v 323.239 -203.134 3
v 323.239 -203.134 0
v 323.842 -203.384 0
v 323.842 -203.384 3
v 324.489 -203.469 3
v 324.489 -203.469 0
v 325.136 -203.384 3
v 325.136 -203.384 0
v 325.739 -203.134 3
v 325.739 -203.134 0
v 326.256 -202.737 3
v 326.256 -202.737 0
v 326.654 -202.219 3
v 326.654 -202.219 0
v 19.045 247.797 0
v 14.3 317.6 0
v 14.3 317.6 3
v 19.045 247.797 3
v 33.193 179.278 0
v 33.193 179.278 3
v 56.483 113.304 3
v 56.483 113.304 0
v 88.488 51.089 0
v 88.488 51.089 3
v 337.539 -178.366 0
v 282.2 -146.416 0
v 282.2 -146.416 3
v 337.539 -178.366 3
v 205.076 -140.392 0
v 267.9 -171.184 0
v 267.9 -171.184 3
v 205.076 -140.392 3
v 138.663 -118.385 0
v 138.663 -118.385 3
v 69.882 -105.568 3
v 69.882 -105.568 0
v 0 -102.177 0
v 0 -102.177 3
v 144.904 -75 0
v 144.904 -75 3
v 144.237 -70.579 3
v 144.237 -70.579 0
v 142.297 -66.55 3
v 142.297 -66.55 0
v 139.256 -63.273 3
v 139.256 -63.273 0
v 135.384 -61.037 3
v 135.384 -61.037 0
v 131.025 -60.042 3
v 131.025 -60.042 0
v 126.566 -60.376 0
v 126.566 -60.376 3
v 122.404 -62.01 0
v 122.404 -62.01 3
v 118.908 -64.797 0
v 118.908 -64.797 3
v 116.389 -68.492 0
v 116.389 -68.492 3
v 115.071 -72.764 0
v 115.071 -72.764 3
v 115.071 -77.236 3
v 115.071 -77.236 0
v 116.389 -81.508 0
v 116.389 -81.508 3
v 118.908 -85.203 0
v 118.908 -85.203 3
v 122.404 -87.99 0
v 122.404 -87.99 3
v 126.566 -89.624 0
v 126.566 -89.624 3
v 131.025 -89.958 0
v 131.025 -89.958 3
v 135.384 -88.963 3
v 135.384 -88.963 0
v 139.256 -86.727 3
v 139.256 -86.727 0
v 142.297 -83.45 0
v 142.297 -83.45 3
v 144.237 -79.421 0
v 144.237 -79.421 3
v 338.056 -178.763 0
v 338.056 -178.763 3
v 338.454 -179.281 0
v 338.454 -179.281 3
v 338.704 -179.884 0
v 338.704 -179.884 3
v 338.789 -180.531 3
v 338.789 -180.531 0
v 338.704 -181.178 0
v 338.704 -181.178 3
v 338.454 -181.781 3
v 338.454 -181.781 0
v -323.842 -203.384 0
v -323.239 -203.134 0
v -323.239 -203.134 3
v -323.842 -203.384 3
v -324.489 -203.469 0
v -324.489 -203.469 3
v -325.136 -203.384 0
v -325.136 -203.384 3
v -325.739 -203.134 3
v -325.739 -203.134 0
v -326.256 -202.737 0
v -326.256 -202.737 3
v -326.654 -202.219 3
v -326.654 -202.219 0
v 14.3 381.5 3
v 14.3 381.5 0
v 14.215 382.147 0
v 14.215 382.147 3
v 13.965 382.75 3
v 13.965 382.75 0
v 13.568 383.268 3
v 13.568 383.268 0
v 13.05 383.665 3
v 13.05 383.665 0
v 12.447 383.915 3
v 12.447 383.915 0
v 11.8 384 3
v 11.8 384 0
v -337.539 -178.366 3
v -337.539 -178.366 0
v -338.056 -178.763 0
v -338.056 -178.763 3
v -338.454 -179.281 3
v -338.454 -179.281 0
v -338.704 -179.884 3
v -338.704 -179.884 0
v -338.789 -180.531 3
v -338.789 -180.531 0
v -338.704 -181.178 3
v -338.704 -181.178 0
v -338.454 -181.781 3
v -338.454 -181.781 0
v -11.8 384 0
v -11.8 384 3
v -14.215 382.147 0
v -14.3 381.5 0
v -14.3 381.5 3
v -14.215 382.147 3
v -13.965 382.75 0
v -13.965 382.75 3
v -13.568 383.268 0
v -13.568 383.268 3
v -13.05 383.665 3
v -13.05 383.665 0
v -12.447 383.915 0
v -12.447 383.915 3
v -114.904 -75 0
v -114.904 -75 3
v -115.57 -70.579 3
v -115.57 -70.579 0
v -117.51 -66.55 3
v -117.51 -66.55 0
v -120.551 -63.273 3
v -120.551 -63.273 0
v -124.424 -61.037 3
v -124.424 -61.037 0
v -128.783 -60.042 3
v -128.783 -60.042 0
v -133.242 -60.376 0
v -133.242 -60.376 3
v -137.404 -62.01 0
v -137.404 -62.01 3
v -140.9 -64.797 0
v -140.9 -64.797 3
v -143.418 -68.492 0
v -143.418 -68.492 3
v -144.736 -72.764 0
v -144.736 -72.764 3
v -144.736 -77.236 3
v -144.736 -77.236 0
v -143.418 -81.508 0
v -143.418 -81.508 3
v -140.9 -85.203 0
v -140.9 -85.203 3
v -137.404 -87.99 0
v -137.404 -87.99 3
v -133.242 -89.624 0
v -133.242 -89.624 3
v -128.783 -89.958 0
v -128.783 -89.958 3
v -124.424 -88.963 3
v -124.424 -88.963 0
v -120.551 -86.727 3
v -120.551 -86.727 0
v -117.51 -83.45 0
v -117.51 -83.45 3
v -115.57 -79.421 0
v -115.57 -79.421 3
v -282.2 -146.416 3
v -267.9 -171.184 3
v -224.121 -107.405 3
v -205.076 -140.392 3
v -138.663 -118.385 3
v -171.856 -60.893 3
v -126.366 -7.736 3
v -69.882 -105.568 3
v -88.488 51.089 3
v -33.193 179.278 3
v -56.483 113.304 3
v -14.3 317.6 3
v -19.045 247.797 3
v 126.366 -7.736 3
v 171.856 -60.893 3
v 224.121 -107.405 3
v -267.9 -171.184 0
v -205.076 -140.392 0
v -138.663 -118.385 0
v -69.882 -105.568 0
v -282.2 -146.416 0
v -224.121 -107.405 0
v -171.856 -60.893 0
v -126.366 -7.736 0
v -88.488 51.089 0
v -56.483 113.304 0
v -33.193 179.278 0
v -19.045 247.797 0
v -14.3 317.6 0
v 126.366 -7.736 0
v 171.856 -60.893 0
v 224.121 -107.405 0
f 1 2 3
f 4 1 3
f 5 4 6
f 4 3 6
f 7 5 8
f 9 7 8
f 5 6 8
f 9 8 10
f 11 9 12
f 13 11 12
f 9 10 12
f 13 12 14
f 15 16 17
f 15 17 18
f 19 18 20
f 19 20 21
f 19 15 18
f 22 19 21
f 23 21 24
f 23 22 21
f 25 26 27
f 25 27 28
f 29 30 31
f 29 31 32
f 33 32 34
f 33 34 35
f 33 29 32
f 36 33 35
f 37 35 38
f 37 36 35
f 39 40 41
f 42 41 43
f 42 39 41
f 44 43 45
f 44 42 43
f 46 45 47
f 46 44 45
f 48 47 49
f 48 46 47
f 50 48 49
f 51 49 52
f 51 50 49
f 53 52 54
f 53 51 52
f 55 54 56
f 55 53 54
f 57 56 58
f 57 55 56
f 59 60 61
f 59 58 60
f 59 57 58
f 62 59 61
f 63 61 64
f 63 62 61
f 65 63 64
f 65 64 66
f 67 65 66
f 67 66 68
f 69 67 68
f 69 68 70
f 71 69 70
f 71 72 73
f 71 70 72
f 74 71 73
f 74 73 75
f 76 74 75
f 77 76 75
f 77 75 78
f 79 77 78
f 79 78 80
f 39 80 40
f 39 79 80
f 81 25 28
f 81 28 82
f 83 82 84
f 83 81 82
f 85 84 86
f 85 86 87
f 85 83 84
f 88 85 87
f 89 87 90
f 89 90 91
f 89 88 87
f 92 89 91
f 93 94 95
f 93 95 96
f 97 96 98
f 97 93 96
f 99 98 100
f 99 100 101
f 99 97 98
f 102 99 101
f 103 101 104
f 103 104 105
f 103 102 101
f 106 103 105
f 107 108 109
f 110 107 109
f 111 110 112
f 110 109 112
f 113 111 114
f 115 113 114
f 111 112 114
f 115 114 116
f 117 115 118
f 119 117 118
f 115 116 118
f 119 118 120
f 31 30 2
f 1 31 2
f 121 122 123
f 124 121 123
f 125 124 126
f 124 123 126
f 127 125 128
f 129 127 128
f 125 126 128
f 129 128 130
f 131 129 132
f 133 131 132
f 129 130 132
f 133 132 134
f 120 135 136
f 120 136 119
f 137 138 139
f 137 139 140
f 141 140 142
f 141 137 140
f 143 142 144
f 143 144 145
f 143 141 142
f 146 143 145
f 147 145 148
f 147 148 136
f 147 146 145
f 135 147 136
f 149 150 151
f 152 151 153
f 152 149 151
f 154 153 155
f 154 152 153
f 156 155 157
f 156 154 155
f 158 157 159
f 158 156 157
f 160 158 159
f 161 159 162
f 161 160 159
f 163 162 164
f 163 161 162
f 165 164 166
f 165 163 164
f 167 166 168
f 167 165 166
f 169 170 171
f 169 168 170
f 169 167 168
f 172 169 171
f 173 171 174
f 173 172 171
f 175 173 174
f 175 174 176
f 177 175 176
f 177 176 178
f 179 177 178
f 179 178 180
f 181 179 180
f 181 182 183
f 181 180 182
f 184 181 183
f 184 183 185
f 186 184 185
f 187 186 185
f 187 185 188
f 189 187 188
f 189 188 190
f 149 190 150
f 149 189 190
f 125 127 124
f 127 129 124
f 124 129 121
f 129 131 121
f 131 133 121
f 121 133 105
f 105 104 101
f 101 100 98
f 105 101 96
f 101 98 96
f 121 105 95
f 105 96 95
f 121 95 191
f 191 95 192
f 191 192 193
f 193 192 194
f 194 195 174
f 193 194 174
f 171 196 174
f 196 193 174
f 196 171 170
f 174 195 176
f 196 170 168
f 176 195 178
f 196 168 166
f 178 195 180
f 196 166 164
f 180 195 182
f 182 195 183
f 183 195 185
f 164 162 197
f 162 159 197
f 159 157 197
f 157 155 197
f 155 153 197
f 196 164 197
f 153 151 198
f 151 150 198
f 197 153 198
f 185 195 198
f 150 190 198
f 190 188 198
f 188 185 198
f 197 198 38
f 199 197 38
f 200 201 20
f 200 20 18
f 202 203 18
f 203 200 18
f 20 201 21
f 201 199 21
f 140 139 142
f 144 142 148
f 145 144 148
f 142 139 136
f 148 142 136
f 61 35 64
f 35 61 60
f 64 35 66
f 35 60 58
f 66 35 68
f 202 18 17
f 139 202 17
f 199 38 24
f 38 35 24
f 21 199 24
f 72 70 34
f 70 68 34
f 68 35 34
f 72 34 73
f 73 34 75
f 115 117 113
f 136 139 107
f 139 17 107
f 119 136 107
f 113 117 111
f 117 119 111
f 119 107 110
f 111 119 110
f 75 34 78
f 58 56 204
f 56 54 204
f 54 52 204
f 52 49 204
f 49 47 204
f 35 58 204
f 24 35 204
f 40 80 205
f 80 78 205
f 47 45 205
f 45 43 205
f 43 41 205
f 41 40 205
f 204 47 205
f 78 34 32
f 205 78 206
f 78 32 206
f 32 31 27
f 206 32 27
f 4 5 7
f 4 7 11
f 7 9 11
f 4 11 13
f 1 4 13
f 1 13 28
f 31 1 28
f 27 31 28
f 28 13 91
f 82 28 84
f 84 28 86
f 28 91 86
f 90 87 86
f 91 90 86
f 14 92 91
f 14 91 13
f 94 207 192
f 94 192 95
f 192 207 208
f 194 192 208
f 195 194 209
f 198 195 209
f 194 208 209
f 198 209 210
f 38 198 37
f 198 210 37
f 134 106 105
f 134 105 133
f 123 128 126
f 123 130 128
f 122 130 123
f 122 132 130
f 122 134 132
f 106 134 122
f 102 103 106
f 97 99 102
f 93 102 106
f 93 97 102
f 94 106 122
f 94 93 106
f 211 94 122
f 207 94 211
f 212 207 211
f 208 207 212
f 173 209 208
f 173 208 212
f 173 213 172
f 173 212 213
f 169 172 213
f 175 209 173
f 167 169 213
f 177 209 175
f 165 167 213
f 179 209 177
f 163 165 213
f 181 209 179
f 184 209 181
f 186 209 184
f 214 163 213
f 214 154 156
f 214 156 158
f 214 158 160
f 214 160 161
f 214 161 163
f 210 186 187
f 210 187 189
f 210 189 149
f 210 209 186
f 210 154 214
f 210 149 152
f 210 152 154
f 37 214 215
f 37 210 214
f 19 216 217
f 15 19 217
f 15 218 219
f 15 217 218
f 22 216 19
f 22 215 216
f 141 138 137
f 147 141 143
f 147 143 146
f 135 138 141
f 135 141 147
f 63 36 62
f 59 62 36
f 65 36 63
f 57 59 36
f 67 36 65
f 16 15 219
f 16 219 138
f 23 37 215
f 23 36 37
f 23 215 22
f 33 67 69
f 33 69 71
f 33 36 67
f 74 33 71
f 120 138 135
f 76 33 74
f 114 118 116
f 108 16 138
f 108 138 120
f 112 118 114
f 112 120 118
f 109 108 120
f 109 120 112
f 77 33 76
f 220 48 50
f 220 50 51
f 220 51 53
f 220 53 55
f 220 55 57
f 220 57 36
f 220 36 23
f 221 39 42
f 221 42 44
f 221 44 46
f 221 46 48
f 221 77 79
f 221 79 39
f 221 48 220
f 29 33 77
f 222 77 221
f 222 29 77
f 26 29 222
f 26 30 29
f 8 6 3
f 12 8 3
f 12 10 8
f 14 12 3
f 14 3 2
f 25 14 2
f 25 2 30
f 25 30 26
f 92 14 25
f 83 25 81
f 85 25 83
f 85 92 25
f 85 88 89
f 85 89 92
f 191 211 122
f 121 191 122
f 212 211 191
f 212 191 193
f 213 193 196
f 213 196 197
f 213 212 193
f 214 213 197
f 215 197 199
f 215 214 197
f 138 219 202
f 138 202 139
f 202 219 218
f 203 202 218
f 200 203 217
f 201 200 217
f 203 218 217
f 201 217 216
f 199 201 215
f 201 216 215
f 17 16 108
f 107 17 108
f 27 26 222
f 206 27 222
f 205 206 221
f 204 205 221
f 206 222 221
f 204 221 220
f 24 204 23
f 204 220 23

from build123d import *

# Parameters (mm, degrees)
PAD038_DEPTH               = 3
PAD038_MIRRORED044_2_DEPTH = 3
POLARPATTERN012_COUNT      = 3
SKETCH179_R                = 15
POCKET144_DEPTH            = 5


with BuildPart() as part:
    # Sketch180 → Pad038 (new body)
    with BuildSketch(Plane.XY):
        with BuildLine():
            Line((14.3, 317.6), (14.3, 381.5))
            ThreePointArc((14.3, 381.5), (13.567767, 383.267767), (11.8, 384))
            Line((11.8, 384), (0, 384))
            Line((0, 384), (0, 0))
            Line((0, 0), (88.487966, 51.088551))
            ThreePointArc((14.3, 317.6), (33.193003, 179.277725), (88.487966, 51.088551))
        make_face()
    pad038 = extrude(amount=PAD038_DEPTH)

    # Sketch180 Mirrored044 2 → Pad038 Mirrored044 2 (add)
    with BuildSketch(Plane(origin=(0, 0, 0), x_dir=(-1, 0, 0), z_dir=(0, 0, -1))):
        with BuildLine():
            Line((14.3, 317.6), (14.3, 381.5))
            ThreePointArc((14.3, 381.5), (13.567767, 383.267767), (11.8, 384))
            Line((11.8, 384), (0, 384))
            Line((0, 384), (0, 0))
            Line((0, 0), (88.487966, 51.088551))
            ThreePointArc((14.3, 317.6), (33.193003, 179.277725), (88.487966, 51.088551))
        make_face()
    pad038_mirrored044_2 = extrude(amount=-PAD038_MIRRORED044_2_DEPTH)

    # PolarPattern012: Pad038, Pad038 Mirrored044 2 ×3 about axis
    polarpattern012_axis = Axis((0, 0, 0), (0, 0, 1))
    for i in range(1, POLARPATTERN012_COUNT):
        add(pad038.rotate(polarpattern012_axis, i * 360 / POLARPATTERN012_COUNT))
        add(pad038_mirrored044_2.rotate(polarpattern012_axis, i * 360 / POLARPATTERN012_COUNT))

    # Sketch179 → Pocket144 (cut)
    with BuildSketch(Plane.XY):
        with Locations((129.903811, -75)):
            Circle(SKETCH179_R)
        with Locations((-129.903811, -75)):
            Circle(SKETCH179_R)
    extrude(amount=POCKET144_DEPTH, mode=Mode.SUBTRACT)


solid = part.part
